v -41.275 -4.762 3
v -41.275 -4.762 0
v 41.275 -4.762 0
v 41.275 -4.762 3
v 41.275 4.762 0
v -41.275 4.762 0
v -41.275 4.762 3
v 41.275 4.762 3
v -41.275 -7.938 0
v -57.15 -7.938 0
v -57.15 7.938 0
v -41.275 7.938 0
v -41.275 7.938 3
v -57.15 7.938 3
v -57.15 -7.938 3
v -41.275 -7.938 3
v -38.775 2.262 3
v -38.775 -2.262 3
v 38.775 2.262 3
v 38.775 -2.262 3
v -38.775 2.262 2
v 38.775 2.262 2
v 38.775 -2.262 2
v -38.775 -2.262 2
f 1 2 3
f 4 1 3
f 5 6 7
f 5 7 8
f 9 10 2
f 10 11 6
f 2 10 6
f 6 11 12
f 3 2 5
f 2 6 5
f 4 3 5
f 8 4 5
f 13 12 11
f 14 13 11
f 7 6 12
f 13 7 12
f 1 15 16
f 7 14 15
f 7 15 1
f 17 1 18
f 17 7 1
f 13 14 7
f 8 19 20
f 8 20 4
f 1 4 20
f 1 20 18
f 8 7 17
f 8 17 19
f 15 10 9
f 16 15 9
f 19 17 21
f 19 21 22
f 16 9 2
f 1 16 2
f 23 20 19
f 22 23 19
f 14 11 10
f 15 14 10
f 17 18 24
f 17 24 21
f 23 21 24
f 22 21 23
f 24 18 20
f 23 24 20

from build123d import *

# Parameters (mm, degrees)
F0_W     = 82.55
F0_H     = 9.525
F1_DEPTH = 3
F2_W     = 77.55
F2_H     = 4.525
F3_DEPTH = 1


with BuildPart() as f1:
    # F0 (on Top) → F1 (new body)
    with BuildSketch(Plane.XY):
        Polygon((-41.275, -4.7625), (-41.275, 4.7625), (-41.275, 7.9375), (-57.15, 7.9375), (-57.15, -7.9375), (-41.275, -7.9375), align=None)
        Rectangle(F0_W, F0_H)
    extrude(amount=F1_DEPTH)

    # F2 (on face) → F3 (cut)
    with BuildSketch(Plane.XY.offset(3)):
        Rectangle(F2_W, F2_H)
    extrude(amount=-F3_DEPTH, mode=Mode.SUBTRACT)


solid = f1.part
